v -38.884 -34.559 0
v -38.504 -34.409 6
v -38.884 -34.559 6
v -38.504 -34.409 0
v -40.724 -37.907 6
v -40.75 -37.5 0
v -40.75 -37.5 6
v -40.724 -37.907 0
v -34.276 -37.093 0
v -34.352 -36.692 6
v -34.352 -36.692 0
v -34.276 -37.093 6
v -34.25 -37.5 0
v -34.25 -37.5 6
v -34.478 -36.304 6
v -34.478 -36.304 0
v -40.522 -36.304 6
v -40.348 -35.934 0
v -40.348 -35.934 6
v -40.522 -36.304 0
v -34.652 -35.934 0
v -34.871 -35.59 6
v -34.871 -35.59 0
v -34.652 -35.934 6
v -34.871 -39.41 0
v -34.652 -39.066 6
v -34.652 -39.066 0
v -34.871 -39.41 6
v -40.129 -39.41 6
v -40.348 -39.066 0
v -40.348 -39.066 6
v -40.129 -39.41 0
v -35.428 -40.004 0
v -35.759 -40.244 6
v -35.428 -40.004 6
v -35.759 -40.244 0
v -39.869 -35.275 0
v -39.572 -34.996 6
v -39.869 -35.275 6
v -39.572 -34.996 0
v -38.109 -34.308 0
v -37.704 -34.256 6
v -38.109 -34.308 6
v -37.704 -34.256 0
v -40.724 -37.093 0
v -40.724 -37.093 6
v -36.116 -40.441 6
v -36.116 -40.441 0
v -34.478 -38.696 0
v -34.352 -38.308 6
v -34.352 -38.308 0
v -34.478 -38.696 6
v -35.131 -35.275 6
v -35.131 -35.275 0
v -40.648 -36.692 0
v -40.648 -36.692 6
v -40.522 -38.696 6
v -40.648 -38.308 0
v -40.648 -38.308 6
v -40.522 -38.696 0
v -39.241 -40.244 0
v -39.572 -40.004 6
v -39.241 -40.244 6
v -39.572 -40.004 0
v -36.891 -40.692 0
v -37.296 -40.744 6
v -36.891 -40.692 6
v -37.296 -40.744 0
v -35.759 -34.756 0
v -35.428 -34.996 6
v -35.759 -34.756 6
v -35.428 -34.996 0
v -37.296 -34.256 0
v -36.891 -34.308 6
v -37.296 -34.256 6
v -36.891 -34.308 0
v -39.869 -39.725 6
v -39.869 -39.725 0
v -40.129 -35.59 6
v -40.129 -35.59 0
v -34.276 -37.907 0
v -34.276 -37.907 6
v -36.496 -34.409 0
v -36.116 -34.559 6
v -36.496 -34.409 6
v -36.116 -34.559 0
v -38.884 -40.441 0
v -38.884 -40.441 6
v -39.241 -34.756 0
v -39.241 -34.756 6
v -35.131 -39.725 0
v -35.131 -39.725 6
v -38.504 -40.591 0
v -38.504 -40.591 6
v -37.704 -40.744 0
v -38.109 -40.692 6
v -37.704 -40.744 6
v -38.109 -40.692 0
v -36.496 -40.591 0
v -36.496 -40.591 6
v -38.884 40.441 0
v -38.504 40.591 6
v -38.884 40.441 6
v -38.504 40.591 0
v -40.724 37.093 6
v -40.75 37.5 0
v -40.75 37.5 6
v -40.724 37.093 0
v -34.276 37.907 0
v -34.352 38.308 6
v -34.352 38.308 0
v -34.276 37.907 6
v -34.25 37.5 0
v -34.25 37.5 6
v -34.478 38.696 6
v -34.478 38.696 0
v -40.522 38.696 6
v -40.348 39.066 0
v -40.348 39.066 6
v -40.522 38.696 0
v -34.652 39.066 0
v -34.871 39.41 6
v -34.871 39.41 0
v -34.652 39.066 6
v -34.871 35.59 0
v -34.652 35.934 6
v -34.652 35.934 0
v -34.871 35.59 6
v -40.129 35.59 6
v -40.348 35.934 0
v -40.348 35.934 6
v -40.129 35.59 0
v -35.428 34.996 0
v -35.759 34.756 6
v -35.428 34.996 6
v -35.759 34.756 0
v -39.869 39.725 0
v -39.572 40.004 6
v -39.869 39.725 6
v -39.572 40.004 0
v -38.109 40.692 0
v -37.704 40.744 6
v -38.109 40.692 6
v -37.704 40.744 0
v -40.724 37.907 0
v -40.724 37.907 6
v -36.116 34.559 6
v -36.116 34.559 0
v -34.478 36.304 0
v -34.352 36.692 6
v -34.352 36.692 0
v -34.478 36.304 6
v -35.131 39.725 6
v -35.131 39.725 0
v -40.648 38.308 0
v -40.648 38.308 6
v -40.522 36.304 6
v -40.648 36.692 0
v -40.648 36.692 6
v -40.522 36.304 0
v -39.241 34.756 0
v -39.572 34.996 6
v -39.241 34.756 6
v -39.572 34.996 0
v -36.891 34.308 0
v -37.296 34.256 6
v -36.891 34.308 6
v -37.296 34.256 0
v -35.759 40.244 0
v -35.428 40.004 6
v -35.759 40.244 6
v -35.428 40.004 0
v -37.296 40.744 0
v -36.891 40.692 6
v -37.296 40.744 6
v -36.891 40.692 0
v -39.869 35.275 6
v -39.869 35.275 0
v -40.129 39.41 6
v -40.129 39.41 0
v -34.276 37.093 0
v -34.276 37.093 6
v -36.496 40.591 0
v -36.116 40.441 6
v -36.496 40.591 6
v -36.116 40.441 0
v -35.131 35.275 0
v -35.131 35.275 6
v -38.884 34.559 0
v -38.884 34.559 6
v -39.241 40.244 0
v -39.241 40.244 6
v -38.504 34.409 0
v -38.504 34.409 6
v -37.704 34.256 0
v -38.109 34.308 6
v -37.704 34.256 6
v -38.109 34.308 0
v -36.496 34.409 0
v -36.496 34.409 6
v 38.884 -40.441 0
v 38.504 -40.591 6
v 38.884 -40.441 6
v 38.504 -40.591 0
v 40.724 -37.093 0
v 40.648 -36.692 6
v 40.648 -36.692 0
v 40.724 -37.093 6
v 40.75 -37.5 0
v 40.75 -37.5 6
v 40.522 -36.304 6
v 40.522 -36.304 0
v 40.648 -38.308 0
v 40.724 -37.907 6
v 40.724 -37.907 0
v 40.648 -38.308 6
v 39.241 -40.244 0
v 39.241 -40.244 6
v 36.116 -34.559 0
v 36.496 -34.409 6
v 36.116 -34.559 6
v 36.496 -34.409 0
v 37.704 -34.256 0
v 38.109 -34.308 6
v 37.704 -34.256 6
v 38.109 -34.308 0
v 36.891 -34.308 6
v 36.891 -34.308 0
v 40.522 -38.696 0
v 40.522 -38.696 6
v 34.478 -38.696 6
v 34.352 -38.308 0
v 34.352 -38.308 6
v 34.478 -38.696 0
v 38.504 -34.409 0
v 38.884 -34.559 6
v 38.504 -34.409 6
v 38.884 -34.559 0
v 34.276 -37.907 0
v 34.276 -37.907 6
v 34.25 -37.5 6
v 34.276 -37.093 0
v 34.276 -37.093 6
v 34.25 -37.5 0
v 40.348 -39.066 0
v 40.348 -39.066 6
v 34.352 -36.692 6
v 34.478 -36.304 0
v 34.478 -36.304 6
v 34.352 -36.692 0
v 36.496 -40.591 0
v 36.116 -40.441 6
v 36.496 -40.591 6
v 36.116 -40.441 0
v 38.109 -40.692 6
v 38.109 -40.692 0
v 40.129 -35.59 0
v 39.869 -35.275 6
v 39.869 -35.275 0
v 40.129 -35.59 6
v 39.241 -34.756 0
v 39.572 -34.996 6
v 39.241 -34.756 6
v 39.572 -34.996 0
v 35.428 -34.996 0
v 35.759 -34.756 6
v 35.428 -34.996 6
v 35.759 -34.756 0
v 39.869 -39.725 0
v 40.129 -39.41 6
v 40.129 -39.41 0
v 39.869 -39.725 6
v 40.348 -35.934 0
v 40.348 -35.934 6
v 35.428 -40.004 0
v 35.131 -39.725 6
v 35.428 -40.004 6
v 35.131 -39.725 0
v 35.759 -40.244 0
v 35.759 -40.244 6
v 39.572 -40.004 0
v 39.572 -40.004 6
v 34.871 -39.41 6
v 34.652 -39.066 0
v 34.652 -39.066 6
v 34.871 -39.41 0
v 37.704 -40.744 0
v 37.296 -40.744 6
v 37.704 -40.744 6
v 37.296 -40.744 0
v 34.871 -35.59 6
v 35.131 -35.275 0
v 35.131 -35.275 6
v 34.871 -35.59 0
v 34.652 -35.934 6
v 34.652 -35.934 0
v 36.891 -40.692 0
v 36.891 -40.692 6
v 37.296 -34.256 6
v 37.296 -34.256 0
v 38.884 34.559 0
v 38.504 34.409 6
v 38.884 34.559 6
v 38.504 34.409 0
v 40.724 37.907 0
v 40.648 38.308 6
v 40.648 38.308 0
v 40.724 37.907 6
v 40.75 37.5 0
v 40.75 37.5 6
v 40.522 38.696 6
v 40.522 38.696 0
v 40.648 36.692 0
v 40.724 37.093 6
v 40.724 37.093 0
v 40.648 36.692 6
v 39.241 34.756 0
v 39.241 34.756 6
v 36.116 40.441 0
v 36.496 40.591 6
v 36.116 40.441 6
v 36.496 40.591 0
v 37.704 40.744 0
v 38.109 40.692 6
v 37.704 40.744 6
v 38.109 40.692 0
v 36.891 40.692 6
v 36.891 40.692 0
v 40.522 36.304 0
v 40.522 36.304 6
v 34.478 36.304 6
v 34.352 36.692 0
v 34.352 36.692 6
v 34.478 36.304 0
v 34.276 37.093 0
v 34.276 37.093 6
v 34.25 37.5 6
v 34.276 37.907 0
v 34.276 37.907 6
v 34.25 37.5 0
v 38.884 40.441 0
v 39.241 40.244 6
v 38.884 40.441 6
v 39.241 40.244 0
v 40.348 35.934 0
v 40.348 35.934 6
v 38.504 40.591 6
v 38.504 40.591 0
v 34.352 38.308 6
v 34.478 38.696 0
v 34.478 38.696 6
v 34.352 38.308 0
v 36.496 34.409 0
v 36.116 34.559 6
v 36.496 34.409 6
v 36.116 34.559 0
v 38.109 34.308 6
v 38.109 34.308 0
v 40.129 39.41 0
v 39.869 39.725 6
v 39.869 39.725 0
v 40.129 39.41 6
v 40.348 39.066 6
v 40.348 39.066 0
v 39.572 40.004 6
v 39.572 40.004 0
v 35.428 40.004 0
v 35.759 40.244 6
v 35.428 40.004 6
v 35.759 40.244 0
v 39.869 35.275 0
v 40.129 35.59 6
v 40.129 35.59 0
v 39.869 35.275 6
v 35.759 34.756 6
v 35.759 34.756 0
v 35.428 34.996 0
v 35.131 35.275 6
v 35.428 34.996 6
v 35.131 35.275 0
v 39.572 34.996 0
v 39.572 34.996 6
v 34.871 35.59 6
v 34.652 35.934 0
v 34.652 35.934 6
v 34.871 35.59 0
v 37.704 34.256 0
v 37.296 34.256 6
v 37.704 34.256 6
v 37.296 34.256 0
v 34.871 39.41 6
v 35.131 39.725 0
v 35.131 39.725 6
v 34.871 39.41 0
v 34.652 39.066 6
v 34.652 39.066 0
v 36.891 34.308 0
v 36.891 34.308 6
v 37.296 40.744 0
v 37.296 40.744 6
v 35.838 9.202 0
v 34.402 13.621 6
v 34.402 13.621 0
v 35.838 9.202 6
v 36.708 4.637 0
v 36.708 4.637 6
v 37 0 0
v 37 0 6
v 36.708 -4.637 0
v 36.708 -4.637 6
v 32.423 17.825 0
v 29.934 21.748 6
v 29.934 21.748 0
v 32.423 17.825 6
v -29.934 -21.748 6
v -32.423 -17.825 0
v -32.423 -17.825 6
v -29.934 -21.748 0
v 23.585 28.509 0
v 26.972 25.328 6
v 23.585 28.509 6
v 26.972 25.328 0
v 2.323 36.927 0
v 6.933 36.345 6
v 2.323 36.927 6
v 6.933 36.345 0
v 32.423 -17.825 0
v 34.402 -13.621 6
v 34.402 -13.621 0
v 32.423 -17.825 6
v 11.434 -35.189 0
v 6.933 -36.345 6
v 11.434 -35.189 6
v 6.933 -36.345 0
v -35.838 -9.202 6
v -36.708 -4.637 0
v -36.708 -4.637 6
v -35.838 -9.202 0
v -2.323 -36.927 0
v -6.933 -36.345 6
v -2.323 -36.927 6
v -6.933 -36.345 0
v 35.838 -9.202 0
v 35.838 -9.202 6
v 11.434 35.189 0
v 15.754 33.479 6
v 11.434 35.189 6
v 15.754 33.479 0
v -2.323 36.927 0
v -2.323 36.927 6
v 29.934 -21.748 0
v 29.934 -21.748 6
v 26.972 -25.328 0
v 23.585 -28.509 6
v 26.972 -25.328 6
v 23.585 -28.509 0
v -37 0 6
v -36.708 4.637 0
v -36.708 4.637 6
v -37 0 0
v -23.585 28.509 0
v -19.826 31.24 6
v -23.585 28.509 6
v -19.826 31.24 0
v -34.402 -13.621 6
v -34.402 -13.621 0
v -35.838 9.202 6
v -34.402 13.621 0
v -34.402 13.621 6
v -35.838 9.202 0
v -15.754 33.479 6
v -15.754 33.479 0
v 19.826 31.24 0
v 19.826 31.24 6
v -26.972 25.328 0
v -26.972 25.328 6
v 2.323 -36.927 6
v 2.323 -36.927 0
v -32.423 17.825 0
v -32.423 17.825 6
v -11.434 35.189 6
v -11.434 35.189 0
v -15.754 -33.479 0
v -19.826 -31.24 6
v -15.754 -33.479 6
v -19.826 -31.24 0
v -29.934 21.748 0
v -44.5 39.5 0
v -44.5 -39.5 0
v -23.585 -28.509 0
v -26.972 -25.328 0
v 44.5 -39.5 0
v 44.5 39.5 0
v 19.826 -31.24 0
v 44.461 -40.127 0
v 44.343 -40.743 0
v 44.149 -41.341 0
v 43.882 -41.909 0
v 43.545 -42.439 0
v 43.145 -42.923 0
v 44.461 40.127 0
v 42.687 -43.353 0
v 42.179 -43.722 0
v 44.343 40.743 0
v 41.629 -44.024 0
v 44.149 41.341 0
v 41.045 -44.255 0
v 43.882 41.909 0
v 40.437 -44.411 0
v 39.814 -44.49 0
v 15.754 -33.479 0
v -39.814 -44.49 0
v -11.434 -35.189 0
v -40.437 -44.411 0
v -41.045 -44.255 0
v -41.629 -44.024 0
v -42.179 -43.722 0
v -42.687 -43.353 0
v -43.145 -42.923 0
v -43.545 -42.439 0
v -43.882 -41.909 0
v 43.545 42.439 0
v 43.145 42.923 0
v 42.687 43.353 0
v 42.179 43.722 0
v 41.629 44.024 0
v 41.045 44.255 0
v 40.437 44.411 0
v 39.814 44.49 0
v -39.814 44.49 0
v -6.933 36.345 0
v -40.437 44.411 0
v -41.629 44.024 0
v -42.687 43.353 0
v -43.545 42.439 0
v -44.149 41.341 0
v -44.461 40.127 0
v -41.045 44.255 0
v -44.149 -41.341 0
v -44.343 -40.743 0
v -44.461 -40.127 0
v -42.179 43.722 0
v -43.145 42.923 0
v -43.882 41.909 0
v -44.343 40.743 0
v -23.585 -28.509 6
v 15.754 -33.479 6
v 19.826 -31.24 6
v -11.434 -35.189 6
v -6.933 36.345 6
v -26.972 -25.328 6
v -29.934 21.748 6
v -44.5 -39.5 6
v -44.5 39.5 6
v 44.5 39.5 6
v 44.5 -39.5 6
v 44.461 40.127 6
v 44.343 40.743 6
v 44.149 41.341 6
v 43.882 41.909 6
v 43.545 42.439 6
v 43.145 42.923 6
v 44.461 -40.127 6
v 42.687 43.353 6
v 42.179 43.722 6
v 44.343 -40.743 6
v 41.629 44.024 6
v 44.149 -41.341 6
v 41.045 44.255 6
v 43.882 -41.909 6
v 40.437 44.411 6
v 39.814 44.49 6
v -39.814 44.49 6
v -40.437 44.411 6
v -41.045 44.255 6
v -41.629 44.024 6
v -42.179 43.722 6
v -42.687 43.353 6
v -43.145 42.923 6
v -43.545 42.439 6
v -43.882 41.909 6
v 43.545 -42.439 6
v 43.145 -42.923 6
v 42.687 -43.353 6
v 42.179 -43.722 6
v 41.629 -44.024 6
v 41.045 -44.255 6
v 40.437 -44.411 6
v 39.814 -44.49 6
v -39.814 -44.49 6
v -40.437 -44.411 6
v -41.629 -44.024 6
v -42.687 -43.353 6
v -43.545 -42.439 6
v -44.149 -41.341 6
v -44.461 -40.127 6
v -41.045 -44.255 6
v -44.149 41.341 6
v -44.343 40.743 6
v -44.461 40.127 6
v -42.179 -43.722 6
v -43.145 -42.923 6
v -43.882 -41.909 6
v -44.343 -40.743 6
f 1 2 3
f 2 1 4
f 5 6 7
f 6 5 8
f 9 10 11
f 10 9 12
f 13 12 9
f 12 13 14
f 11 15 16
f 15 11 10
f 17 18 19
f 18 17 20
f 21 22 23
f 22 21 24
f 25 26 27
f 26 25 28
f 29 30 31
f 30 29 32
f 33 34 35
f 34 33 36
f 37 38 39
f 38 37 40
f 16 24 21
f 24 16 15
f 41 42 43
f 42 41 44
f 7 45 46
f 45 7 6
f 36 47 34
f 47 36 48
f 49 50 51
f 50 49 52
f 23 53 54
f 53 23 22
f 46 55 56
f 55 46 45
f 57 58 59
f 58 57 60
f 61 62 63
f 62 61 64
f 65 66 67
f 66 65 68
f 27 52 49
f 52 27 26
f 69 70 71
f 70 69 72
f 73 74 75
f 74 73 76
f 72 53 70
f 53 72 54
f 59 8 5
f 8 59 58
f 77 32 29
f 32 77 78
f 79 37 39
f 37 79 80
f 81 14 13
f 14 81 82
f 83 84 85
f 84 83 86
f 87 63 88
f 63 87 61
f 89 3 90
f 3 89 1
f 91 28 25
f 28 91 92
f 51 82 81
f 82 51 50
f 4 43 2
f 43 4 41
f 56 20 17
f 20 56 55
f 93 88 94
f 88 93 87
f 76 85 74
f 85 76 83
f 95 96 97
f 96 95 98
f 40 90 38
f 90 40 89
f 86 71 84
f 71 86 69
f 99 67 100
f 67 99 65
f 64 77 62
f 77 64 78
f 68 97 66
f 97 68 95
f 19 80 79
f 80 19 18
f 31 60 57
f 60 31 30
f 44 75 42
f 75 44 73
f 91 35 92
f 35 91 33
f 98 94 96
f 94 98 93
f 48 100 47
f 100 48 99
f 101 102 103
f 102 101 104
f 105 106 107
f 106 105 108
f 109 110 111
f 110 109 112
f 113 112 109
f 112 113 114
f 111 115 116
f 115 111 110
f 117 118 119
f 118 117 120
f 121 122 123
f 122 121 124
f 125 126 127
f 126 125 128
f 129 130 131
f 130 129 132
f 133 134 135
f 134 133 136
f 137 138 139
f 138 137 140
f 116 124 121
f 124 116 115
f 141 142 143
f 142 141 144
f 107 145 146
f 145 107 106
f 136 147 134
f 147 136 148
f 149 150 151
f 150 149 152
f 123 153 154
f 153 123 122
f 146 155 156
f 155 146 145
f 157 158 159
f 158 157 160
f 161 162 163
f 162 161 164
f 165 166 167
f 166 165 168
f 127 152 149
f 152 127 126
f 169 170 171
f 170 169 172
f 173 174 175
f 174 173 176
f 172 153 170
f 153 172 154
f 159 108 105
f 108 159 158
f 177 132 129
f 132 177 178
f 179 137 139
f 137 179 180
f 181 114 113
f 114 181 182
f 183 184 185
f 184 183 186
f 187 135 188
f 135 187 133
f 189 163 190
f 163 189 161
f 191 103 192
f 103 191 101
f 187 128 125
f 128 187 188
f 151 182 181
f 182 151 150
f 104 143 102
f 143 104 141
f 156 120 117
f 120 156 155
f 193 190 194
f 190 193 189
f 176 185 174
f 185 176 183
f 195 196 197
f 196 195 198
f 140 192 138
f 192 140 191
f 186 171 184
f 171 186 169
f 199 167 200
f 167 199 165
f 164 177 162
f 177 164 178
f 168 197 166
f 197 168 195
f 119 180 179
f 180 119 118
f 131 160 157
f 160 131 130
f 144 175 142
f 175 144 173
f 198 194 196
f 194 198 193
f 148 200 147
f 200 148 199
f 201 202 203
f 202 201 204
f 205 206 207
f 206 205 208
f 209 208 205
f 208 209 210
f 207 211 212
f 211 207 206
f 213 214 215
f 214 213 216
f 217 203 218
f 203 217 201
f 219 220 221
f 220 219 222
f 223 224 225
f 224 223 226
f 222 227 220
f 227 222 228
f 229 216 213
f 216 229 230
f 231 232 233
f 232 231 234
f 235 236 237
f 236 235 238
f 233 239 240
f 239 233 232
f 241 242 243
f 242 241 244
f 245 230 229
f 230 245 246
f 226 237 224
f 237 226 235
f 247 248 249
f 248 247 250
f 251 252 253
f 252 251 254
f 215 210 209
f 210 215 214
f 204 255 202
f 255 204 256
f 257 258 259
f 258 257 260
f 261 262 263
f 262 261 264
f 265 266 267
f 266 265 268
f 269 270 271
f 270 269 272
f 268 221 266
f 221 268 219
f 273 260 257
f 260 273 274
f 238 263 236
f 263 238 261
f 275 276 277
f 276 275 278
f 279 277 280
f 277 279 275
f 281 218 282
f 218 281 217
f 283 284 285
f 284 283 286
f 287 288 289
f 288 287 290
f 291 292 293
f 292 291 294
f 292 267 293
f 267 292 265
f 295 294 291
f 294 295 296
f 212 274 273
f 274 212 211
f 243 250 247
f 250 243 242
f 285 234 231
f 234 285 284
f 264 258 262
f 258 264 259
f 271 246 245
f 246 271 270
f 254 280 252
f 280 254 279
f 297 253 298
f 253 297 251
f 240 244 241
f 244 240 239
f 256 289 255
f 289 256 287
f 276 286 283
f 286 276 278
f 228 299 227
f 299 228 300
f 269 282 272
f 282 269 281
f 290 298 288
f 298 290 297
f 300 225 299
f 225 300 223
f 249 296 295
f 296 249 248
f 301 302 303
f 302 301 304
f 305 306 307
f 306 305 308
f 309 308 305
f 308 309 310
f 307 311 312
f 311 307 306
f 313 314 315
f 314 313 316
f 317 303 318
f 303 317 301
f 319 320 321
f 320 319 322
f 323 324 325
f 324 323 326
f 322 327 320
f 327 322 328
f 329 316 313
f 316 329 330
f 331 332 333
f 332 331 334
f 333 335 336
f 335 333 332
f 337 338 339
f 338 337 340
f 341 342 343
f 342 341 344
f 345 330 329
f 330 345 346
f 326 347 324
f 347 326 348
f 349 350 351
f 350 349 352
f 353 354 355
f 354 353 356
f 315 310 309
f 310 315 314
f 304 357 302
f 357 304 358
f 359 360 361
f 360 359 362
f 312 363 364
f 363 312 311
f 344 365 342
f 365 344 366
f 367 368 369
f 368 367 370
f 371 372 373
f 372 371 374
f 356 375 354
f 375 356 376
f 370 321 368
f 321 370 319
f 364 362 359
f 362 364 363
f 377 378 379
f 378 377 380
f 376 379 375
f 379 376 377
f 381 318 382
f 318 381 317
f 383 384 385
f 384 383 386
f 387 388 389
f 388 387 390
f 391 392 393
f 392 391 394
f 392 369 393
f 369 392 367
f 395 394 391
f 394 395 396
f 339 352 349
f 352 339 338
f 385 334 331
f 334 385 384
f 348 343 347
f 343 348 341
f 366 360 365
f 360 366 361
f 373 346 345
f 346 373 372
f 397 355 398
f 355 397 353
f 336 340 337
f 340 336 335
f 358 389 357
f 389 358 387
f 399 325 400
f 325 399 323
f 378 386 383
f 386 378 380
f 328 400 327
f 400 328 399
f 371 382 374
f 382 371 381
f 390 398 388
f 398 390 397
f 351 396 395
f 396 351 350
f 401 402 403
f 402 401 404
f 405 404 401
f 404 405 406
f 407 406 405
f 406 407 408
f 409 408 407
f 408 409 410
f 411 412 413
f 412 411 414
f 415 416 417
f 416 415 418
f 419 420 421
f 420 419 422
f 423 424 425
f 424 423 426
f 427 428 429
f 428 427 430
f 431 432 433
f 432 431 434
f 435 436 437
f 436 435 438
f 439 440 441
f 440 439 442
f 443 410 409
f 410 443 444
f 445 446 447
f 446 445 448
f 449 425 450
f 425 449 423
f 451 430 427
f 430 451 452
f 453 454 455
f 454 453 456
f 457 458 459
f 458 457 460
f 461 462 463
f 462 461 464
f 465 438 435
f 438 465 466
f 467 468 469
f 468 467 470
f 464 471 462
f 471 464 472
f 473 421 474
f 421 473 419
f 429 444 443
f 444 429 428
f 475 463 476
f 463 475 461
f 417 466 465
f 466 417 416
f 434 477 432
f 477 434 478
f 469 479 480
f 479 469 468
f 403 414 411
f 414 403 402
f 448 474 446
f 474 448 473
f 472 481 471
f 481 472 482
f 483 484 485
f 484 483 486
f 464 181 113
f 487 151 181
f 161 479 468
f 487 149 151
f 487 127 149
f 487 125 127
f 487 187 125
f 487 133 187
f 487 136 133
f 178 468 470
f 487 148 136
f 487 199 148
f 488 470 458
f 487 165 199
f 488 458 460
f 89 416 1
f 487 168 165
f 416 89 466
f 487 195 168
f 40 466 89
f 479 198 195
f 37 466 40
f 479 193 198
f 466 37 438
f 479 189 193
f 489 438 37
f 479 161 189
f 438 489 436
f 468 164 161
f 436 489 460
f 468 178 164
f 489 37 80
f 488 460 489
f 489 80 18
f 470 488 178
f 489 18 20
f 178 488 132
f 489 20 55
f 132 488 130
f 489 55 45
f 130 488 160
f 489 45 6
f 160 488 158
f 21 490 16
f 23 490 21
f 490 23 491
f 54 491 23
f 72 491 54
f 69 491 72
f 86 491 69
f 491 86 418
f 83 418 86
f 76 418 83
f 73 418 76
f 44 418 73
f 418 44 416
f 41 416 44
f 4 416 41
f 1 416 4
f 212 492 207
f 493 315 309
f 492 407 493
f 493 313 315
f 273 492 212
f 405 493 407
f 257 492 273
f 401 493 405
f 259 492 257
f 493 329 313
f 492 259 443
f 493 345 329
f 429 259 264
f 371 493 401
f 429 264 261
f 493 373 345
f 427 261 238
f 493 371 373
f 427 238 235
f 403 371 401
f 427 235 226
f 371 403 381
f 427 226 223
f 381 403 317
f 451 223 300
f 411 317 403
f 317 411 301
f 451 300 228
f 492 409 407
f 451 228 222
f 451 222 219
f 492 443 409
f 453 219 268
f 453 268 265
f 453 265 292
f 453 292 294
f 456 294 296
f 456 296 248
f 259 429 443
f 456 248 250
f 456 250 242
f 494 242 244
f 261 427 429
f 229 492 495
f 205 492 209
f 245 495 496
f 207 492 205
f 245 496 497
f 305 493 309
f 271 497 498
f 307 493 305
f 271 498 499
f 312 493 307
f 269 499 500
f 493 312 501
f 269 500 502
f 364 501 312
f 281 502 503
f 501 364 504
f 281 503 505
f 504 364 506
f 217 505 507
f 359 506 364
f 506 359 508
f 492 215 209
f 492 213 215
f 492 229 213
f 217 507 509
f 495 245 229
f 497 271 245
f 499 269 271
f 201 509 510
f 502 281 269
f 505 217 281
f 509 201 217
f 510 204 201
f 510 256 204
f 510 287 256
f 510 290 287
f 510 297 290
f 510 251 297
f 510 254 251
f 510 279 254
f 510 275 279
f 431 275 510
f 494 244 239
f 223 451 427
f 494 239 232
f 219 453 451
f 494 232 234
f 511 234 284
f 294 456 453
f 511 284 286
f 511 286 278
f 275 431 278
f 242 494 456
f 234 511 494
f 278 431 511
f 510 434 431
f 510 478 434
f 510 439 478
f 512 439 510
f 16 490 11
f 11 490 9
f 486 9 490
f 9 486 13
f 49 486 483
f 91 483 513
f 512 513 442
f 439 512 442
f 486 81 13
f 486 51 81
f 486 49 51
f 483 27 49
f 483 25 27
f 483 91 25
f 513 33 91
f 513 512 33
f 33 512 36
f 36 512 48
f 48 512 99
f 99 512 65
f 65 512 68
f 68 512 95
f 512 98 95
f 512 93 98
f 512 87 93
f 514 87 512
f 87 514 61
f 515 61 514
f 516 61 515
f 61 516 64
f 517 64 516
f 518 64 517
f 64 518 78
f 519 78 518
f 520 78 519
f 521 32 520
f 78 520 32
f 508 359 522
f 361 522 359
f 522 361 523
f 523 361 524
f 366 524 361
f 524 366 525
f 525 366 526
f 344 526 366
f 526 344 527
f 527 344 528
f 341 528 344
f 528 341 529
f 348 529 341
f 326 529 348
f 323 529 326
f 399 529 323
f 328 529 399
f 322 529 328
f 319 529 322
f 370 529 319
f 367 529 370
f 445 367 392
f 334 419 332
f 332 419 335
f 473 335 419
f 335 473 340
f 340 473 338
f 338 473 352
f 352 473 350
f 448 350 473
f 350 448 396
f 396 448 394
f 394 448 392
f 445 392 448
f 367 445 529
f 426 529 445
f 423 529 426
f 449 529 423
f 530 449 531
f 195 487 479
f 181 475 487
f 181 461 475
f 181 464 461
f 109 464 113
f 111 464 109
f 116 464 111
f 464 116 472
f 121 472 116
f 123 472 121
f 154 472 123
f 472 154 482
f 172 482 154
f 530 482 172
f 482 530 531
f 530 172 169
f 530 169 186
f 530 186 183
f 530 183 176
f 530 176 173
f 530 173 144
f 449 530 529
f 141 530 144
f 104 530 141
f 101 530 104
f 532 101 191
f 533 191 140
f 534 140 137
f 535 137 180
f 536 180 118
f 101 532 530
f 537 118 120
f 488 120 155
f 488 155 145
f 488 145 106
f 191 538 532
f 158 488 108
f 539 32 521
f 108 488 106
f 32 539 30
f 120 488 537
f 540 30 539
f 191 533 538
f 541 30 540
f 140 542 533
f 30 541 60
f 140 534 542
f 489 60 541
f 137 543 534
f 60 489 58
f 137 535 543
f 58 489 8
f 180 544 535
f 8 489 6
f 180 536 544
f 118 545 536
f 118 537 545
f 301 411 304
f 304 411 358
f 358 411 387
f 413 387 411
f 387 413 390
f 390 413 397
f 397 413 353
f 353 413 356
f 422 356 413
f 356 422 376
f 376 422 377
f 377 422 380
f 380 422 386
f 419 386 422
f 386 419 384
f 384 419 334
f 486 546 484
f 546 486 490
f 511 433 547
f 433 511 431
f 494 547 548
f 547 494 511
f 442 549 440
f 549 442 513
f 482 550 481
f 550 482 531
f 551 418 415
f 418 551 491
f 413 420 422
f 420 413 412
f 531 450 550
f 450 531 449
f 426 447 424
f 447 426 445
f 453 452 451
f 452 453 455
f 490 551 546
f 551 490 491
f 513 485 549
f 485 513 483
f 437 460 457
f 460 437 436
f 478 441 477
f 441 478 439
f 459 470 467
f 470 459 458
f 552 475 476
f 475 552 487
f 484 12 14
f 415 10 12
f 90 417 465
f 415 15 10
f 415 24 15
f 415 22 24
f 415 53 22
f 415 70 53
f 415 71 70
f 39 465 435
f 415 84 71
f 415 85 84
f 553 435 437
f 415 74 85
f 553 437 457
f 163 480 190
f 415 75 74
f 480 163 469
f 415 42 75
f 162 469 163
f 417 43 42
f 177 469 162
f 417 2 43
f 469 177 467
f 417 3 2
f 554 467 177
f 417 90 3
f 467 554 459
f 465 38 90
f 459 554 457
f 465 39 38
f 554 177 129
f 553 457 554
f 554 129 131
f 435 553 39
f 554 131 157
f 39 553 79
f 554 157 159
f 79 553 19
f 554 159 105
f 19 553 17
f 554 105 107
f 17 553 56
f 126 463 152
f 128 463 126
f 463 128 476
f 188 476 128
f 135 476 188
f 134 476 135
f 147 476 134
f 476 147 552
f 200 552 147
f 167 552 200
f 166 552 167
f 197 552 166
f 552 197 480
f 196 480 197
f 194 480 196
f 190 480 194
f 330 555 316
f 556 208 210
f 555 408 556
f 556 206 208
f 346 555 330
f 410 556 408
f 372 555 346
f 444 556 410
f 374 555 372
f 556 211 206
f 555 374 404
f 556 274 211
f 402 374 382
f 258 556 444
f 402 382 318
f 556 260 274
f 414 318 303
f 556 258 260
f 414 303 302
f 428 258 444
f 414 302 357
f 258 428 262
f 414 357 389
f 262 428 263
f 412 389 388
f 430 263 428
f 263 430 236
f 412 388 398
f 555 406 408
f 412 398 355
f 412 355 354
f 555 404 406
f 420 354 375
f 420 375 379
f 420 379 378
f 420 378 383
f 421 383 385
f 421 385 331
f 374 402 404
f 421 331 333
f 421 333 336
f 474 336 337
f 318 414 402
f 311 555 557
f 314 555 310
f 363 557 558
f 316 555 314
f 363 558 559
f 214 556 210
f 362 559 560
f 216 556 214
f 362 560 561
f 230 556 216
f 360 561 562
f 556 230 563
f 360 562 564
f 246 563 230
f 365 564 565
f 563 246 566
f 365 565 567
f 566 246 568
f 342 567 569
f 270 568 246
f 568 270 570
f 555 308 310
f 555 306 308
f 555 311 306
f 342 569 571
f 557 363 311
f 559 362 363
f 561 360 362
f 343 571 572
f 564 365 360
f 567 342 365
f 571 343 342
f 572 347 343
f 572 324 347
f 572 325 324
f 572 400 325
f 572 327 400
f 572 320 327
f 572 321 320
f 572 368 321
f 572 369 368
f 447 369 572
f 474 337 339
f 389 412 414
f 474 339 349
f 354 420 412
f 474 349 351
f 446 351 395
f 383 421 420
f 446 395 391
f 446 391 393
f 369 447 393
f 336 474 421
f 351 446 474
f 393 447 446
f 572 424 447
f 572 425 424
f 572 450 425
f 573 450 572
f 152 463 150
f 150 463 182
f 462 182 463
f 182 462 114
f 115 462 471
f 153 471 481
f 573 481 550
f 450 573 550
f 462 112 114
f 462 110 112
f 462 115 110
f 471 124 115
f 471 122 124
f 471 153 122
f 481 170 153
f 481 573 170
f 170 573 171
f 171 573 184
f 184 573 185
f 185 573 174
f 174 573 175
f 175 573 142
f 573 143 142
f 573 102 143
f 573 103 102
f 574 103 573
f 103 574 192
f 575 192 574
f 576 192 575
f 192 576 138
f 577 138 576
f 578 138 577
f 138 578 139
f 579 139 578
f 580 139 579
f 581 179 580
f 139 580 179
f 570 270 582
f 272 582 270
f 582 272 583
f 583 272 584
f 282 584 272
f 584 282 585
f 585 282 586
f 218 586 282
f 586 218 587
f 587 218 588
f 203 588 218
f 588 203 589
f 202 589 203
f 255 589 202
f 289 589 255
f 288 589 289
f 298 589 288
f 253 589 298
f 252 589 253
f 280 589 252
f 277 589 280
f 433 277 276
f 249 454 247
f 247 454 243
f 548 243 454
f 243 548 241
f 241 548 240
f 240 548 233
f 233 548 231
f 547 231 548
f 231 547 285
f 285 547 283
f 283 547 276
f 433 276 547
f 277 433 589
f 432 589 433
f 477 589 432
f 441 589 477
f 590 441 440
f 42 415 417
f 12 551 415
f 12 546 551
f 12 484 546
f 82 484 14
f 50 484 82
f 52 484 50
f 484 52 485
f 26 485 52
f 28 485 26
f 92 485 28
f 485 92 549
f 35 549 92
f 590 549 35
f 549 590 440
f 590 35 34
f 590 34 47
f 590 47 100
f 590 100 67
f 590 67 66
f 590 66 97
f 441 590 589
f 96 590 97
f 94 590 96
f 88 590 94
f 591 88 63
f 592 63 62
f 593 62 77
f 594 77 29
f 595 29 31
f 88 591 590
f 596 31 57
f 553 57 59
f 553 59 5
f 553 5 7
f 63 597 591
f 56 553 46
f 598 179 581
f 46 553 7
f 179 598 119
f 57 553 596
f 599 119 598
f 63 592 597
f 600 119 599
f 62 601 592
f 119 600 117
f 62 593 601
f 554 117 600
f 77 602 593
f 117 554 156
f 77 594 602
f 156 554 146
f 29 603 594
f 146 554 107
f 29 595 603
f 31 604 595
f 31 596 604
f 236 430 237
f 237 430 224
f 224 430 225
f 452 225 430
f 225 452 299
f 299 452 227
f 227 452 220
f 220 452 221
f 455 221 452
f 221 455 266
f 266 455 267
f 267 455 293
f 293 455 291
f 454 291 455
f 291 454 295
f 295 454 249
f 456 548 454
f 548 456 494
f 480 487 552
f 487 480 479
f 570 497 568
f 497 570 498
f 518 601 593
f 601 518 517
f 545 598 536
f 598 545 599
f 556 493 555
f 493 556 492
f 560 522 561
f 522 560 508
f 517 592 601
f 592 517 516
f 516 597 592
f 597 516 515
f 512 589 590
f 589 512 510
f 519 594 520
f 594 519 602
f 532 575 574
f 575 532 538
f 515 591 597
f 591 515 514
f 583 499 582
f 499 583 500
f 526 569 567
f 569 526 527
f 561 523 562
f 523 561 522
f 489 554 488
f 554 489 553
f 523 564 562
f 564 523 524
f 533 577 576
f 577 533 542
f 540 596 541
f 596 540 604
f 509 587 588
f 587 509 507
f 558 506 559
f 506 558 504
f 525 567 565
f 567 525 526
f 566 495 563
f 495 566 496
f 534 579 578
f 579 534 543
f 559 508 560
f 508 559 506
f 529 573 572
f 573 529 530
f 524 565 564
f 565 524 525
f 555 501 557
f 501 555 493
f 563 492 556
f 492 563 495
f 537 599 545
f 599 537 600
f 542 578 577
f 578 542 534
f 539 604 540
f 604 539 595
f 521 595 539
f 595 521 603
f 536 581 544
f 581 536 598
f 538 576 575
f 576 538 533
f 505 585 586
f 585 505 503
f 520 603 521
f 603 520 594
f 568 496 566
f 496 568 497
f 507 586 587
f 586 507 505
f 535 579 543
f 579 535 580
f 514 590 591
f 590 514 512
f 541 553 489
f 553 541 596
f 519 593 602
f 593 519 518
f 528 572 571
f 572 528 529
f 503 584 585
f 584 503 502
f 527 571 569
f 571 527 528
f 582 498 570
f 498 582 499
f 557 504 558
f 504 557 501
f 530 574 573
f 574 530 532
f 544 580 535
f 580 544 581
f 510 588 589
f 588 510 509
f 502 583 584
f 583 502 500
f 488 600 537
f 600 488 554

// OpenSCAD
$fn = 50;

difference() {
	union() {
		hull() {
			translate(v = [-39.5, 39.5, 0]) {
				cylinder(h = 6, r = 5);
			}
			translate(v = [39.5, 39.5, 0]) {
				cylinder(h = 6, r = 5);
			}
			translate(v = [-39.5, -39.5, 0]) {
				cylinder(h = 6, r = 5);
			}
			translate(v = [39.5, -39.5, 0]) {
				cylinder(h = 6, r = 5);
			}
		}
	}
	union() {
		translate(v = [-37.5, -37.5, -100.0]) {
			cylinder(h = 200, r = 3.25);
		}
		translate(v = [-37.5, 37.5, -100.0]) {
			cylinder(h = 200, r = 3.25);
		}
		translate(v = [37.5, -37.5, -100.0]) {
			cylinder(h = 200, r = 3.25);
		}
		translate(v = [37.5, 37.5, -100.0]) {
			cylinder(h = 200, r = 3.25);
		}
		translate(v = [-37.5, -37.5, -100.0]) {
			cylinder(h = 200, r = 1.8);
		}
		translate(v = [-37.5, 37.5, -100.0]) {
			cylinder(h = 200, r = 1.8);
		}
		translate(v = [37.5, -37.5, -100.0]) {
			cylinder(h = 200, r = 1.8);
		}
		translate(v = [37.5, 37.5, -100.0]) {
			cylinder(h = 200, r = 1.8);
		}
		cylinder(h = 6, r = 37.0);
	}
}
